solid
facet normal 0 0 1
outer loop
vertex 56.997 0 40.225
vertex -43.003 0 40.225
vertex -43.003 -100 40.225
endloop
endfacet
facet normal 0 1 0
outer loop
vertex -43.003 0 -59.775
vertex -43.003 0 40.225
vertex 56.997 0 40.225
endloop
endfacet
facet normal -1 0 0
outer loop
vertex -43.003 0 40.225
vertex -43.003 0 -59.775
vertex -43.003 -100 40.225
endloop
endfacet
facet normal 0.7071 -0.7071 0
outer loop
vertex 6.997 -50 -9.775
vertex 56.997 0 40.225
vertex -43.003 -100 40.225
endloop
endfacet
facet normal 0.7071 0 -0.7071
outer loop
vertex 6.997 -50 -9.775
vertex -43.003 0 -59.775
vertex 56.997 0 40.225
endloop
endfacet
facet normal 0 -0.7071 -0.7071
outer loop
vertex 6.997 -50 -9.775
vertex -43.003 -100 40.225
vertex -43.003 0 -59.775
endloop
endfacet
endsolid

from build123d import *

# Parameters (mm, degrees)
F0_W     = 100
F0_H     = 100
F1_DEPTH = 100
F3_DEPTH = 100
F5_DEPTH = 100
F7_DEPTH = 100


with BuildPart() as f1:
    # F0 (on Front) → F1 (new body)
    with BuildSketch(Plane.XZ):
        with Locations((6.997038, -9.774505)):
            Rectangle(F0_W, F0_H)
    extrude(amount=F1_DEPTH)

    # F2 (on face) → F3 (cut)
    with BuildSketch(Plane.XY.offset(40.225495)):
        Polygon((56.997038, 0), (-43.002962, -100), (56.997038, -100), align=None)
    extrude(amount=-F3_DEPTH, mode=Mode.SUBTRACT)

    # F4 (on face) → F5 (cut)
    with BuildSketch(Plane(origin=(-43.002962, 0, 0), x_dir=(0, -1, 0), z_dir=(-1, 0, 0))):
        Polygon((100, -59.774505), (100, 40.225495), (0, -59.774505), align=None)
    extrude(amount=-F5_DEPTH, mode=Mode.SUBTRACT)

    # F6 (on face) → F7 (cut)
    with BuildSketch(Plane(origin=(0, 0, 0), x_dir=(-1, 0, 0), z_dir=(0, 1, 0))):
        Polygon((-56.997038, -59.774505), (43.002962, -59.774505), (-56.997038, 40.225495), align=None)
    extrude(amount=-F7_DEPTH, mode=Mode.SUBTRACT)


solid = f1.part
